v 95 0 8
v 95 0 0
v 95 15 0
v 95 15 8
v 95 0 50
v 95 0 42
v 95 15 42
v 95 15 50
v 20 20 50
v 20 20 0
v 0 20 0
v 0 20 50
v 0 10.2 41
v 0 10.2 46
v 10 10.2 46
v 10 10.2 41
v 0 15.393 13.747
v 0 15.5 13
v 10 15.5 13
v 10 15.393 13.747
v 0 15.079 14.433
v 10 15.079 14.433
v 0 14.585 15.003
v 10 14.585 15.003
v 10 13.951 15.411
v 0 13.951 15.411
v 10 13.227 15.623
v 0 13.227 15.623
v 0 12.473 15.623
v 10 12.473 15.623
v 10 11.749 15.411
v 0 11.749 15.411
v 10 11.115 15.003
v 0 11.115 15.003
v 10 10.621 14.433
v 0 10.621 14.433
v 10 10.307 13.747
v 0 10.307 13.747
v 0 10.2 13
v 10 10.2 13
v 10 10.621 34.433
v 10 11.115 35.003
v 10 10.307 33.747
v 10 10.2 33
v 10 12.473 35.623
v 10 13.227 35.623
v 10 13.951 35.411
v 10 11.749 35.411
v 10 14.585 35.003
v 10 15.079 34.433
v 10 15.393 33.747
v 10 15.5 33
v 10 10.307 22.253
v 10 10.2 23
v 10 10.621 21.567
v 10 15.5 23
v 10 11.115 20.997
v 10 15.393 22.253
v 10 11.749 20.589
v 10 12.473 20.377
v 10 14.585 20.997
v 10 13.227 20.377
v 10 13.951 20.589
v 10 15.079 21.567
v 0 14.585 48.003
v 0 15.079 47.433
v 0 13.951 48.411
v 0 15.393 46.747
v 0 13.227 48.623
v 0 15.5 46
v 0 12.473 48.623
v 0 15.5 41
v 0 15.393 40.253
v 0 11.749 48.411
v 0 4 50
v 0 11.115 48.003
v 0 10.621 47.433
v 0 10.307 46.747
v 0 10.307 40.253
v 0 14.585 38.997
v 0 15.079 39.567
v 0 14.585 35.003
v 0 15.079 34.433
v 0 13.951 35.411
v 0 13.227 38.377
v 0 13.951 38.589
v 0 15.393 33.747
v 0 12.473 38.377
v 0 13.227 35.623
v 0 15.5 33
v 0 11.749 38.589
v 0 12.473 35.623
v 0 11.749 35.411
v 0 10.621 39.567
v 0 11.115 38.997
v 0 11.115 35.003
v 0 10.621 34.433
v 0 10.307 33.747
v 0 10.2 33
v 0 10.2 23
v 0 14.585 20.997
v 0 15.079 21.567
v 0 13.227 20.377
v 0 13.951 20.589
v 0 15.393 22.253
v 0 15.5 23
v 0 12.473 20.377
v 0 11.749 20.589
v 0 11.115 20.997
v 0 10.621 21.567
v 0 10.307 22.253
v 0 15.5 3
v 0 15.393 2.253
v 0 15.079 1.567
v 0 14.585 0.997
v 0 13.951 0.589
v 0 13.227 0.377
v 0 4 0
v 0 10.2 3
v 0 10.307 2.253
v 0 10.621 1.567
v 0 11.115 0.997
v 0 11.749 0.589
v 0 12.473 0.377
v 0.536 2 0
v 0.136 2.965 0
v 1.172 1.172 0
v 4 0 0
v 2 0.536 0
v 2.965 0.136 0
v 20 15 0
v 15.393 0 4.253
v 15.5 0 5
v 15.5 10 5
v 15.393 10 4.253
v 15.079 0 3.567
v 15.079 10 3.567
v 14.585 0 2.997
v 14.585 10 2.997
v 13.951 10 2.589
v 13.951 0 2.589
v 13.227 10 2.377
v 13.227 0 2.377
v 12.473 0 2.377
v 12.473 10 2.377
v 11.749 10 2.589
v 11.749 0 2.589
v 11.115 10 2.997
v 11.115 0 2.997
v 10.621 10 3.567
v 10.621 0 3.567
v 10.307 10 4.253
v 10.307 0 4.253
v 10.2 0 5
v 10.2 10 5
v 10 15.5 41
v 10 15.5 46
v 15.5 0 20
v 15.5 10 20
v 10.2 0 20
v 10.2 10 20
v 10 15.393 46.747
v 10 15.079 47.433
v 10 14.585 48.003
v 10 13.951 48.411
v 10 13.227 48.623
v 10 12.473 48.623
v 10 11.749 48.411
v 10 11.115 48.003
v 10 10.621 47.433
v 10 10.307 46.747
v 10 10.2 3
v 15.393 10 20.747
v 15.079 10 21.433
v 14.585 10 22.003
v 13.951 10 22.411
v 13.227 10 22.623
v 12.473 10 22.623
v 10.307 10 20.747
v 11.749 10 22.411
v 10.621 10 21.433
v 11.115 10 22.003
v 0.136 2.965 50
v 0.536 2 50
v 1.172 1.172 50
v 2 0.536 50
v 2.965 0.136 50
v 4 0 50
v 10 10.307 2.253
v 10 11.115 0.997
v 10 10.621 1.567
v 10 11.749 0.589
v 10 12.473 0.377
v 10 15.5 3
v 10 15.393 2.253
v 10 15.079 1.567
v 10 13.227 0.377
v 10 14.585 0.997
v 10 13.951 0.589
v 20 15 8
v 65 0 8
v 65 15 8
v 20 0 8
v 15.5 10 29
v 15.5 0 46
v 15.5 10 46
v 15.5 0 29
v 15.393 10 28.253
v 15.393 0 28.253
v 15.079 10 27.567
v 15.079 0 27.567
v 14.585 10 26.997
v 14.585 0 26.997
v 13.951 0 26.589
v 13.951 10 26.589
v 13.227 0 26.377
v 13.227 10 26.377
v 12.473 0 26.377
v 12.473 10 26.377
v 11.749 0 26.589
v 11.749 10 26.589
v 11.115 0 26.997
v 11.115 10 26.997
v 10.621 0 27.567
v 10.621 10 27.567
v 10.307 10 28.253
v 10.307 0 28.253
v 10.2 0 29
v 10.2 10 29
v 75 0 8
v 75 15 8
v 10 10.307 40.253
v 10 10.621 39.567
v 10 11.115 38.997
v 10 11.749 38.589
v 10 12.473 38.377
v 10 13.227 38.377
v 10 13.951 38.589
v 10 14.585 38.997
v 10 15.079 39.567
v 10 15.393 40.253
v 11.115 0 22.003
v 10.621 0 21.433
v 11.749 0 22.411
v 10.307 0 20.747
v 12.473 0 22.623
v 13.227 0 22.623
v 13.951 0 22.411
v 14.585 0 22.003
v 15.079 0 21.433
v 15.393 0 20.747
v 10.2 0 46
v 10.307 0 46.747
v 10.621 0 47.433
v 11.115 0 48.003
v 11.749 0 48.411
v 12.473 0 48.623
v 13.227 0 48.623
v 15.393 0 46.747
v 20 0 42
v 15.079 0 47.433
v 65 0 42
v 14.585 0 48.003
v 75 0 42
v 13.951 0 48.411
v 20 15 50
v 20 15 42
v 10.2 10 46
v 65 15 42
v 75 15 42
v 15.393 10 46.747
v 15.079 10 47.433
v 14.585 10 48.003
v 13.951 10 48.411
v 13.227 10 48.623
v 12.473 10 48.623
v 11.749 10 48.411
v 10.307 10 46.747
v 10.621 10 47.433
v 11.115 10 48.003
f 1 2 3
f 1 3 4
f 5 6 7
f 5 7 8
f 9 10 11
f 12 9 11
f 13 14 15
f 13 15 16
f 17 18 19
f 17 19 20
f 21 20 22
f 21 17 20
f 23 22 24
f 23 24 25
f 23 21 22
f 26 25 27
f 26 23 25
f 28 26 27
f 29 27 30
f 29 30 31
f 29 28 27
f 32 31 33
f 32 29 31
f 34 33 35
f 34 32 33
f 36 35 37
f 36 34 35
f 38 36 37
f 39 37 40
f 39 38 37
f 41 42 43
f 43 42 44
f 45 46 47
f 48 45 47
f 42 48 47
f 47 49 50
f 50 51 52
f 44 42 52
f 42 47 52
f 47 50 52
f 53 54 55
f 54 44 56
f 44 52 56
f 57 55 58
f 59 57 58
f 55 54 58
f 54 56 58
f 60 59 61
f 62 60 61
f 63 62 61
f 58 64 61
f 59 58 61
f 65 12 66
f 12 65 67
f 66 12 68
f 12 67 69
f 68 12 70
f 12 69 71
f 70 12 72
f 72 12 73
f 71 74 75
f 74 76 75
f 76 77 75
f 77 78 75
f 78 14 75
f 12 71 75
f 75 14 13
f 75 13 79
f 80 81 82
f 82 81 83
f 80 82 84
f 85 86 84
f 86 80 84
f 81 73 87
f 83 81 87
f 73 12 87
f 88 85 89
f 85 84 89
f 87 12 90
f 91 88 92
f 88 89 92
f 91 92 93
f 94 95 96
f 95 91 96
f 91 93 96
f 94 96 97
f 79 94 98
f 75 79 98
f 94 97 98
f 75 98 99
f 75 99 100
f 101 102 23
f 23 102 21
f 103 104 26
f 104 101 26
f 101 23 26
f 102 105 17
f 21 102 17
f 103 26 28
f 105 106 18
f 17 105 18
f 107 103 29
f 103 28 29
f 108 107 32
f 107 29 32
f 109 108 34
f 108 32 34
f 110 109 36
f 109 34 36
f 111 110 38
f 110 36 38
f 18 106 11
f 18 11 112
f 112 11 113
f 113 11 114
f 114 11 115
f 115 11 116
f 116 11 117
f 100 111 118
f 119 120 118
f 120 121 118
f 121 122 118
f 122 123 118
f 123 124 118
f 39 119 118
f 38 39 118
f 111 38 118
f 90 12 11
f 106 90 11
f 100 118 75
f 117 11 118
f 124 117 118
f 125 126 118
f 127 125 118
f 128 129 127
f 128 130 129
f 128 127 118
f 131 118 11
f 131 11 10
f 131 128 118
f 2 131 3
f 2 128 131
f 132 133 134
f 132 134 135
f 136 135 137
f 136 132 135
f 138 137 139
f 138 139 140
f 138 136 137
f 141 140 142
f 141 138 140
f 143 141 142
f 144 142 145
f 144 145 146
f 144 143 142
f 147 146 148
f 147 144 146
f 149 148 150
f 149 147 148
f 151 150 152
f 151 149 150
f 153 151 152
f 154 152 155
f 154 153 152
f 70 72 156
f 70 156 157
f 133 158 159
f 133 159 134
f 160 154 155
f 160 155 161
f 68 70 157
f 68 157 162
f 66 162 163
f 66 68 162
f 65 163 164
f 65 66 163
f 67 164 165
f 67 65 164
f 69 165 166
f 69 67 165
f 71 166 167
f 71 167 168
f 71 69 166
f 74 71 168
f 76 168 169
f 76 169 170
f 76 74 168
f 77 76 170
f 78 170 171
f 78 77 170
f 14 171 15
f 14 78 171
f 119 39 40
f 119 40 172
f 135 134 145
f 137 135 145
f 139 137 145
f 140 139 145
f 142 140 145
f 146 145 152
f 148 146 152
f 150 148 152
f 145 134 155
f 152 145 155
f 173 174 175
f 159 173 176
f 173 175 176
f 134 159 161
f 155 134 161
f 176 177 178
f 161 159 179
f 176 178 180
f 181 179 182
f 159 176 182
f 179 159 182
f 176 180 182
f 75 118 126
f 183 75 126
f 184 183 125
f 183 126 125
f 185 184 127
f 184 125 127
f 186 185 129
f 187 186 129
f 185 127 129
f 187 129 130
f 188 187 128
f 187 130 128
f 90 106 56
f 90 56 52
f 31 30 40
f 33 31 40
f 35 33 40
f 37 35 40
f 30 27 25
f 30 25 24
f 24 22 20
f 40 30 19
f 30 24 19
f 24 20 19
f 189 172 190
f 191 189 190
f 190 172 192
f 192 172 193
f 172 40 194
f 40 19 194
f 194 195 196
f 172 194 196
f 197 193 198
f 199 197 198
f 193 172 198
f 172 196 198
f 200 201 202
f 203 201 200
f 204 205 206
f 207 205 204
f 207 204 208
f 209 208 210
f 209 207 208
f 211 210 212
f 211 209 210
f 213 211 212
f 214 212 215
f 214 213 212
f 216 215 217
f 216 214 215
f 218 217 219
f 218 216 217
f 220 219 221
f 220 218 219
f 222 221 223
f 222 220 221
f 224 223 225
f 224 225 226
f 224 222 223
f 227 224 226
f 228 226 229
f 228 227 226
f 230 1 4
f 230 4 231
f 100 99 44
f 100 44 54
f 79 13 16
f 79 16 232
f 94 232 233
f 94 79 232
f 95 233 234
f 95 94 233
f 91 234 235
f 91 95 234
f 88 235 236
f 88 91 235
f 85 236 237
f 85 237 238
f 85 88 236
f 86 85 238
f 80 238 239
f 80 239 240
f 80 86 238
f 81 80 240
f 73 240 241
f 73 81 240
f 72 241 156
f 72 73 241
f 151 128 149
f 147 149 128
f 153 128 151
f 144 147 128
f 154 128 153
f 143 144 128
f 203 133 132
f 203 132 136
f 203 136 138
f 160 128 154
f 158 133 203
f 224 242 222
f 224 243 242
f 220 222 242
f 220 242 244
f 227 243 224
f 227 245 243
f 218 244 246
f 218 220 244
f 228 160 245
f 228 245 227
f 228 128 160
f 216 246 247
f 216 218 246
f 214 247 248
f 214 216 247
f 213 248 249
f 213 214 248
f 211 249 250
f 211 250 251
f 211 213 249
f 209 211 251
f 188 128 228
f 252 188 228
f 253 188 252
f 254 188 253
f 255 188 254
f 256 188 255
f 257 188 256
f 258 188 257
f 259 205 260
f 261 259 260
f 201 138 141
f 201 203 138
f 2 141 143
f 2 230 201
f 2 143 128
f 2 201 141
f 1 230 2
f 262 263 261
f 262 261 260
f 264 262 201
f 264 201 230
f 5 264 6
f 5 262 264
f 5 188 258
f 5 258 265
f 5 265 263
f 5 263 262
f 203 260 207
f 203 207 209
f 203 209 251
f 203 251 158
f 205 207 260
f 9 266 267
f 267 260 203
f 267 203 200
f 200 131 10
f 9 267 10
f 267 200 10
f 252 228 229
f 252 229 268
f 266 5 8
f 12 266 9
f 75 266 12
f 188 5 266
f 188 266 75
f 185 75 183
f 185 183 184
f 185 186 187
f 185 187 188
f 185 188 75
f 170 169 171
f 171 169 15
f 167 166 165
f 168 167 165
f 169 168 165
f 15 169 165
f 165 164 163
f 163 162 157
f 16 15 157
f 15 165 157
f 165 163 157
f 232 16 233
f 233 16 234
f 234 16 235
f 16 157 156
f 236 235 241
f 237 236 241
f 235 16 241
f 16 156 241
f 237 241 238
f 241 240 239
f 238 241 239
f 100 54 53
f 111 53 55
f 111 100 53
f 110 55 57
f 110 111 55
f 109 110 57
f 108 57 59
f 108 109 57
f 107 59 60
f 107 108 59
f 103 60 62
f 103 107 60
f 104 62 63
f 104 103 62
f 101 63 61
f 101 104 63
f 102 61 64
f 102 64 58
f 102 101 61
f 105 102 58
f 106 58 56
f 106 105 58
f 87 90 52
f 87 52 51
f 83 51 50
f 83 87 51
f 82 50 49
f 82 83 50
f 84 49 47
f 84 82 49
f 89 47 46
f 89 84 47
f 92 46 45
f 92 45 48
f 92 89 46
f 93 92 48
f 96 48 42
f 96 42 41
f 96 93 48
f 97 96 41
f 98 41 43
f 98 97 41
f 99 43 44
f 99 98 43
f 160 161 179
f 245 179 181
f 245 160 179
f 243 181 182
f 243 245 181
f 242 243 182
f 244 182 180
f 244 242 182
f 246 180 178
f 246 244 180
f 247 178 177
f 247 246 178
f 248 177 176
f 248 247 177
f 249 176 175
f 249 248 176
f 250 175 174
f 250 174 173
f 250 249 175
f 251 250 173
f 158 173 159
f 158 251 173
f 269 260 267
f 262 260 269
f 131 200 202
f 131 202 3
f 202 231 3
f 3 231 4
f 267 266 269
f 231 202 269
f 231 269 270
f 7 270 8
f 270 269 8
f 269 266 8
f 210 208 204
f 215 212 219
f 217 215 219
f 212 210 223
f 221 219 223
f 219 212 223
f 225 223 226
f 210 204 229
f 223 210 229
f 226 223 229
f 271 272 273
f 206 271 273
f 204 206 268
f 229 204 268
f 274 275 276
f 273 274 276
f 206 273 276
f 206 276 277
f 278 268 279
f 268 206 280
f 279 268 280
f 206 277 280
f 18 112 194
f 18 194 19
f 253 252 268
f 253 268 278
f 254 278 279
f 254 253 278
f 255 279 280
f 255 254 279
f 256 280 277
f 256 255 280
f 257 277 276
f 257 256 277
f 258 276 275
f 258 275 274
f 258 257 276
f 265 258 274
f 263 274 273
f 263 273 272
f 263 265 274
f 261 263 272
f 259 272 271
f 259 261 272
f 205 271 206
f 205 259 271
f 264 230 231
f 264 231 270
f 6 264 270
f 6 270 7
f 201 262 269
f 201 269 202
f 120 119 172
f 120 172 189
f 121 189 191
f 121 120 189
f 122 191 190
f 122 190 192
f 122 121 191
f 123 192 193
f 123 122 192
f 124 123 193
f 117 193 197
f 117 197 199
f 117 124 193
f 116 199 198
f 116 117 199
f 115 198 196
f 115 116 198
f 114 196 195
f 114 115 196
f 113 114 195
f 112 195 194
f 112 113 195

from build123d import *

# Parameters (mm, degrees)
EXTRUDE_1_DEPTH     = 50
CUT_EXTRUDE_1_DEPTH = 10
CUT_EXTRUDE_2_DEPTH = 10
EXTRUDE_2_DEPTH     = 15


with BuildPart() as part:
    # 草图1 → 凸台-拉伸1 (new body)
    with BuildSketch(Plane.XY):
        with BuildLine():
            Line((4, 0), (20, 0))
            Line((20, 0), (20, 20))
            Line((20, 20), (0, 20))
            Line((0, 20), (0, 4))
            ThreePointArc((0, 4), (1.171572875, 1.171572875), (4, 0))
        make_face()
    extrude(amount=EXTRUDE_1_DEPTH)

    # 草图2 → 切除-拉伸1 (cut)
    with BuildSketch(Plane.ZY):
        with BuildLine():
            Line((3, 15.5), (13, 15.5))
            ThreePointArc((13, 15.5), (15.65, 12.85), (13, 10.2))
            Line((13, 10.2), (3, 10.2))
            ThreePointArc((3, 10.2), (0.35, 12.85), (3, 15.5))
        make_face()
        with BuildLine():
            Line((23, 15.5), (33, 15.5))
            ThreePointArc((33, 15.5), (35.65, 12.85), (33, 10.2))
            Line((33, 10.2), (23, 10.2))
            ThreePointArc((23, 10.2), (20.35, 12.85), (23, 15.5))
        make_face()
        with BuildLine():
            Line((41, 15.5), (46, 15.5))
            ThreePointArc((46, 15.5), (48.65, 12.85), (46, 10.2))
            Line((46, 10.2), (41, 10.2))
            ThreePointArc((41, 10.2), (38.35, 12.85), (41, 15.5))
        make_face()
    extrude(amount=-CUT_EXTRUDE_1_DEPTH, mode=Mode.SUBTRACT)

    # 草图3 → 切除-拉伸2 (cut)
    with BuildSketch(Plane.XZ):
        with BuildLine():
            Line((15.5, 46), (15.5, 29))
            ThreePointArc((15.5, 29), (12.85, 26.35), (10.2, 29))
            Line((10.2, 29), (10.2, 46))
            ThreePointArc((10.2, 46), (12.85, 48.65), (15.5, 46))
        make_face()
        with BuildLine():
            Line((15.5, 20), (15.5, 5))
            ThreePointArc((15.5, 5), (12.85, 2.35), (10.2, 5))
            Line((10.2, 5), (10.2, 20))
            ThreePointArc((10.2, 20), (12.85, 22.65), (15.5, 20))
        make_face()
    extrude(amount=-CUT_EXTRUDE_2_DEPTH, mode=Mode.SUBTRACT)

    # 草图4 → 凸台-拉伸2 (add)
    with BuildSketch(Plane.XZ):
        Polygon((95, 42), (95, 50), (20, 50), (20, 42), (65, 42), (65, 8), (20, 8), (20, 0), (95, 0), (95, 8), (75, 8), (75, 42), align=None)
    extrude(amount=-EXTRUDE_2_DEPTH)


solid = part.part
